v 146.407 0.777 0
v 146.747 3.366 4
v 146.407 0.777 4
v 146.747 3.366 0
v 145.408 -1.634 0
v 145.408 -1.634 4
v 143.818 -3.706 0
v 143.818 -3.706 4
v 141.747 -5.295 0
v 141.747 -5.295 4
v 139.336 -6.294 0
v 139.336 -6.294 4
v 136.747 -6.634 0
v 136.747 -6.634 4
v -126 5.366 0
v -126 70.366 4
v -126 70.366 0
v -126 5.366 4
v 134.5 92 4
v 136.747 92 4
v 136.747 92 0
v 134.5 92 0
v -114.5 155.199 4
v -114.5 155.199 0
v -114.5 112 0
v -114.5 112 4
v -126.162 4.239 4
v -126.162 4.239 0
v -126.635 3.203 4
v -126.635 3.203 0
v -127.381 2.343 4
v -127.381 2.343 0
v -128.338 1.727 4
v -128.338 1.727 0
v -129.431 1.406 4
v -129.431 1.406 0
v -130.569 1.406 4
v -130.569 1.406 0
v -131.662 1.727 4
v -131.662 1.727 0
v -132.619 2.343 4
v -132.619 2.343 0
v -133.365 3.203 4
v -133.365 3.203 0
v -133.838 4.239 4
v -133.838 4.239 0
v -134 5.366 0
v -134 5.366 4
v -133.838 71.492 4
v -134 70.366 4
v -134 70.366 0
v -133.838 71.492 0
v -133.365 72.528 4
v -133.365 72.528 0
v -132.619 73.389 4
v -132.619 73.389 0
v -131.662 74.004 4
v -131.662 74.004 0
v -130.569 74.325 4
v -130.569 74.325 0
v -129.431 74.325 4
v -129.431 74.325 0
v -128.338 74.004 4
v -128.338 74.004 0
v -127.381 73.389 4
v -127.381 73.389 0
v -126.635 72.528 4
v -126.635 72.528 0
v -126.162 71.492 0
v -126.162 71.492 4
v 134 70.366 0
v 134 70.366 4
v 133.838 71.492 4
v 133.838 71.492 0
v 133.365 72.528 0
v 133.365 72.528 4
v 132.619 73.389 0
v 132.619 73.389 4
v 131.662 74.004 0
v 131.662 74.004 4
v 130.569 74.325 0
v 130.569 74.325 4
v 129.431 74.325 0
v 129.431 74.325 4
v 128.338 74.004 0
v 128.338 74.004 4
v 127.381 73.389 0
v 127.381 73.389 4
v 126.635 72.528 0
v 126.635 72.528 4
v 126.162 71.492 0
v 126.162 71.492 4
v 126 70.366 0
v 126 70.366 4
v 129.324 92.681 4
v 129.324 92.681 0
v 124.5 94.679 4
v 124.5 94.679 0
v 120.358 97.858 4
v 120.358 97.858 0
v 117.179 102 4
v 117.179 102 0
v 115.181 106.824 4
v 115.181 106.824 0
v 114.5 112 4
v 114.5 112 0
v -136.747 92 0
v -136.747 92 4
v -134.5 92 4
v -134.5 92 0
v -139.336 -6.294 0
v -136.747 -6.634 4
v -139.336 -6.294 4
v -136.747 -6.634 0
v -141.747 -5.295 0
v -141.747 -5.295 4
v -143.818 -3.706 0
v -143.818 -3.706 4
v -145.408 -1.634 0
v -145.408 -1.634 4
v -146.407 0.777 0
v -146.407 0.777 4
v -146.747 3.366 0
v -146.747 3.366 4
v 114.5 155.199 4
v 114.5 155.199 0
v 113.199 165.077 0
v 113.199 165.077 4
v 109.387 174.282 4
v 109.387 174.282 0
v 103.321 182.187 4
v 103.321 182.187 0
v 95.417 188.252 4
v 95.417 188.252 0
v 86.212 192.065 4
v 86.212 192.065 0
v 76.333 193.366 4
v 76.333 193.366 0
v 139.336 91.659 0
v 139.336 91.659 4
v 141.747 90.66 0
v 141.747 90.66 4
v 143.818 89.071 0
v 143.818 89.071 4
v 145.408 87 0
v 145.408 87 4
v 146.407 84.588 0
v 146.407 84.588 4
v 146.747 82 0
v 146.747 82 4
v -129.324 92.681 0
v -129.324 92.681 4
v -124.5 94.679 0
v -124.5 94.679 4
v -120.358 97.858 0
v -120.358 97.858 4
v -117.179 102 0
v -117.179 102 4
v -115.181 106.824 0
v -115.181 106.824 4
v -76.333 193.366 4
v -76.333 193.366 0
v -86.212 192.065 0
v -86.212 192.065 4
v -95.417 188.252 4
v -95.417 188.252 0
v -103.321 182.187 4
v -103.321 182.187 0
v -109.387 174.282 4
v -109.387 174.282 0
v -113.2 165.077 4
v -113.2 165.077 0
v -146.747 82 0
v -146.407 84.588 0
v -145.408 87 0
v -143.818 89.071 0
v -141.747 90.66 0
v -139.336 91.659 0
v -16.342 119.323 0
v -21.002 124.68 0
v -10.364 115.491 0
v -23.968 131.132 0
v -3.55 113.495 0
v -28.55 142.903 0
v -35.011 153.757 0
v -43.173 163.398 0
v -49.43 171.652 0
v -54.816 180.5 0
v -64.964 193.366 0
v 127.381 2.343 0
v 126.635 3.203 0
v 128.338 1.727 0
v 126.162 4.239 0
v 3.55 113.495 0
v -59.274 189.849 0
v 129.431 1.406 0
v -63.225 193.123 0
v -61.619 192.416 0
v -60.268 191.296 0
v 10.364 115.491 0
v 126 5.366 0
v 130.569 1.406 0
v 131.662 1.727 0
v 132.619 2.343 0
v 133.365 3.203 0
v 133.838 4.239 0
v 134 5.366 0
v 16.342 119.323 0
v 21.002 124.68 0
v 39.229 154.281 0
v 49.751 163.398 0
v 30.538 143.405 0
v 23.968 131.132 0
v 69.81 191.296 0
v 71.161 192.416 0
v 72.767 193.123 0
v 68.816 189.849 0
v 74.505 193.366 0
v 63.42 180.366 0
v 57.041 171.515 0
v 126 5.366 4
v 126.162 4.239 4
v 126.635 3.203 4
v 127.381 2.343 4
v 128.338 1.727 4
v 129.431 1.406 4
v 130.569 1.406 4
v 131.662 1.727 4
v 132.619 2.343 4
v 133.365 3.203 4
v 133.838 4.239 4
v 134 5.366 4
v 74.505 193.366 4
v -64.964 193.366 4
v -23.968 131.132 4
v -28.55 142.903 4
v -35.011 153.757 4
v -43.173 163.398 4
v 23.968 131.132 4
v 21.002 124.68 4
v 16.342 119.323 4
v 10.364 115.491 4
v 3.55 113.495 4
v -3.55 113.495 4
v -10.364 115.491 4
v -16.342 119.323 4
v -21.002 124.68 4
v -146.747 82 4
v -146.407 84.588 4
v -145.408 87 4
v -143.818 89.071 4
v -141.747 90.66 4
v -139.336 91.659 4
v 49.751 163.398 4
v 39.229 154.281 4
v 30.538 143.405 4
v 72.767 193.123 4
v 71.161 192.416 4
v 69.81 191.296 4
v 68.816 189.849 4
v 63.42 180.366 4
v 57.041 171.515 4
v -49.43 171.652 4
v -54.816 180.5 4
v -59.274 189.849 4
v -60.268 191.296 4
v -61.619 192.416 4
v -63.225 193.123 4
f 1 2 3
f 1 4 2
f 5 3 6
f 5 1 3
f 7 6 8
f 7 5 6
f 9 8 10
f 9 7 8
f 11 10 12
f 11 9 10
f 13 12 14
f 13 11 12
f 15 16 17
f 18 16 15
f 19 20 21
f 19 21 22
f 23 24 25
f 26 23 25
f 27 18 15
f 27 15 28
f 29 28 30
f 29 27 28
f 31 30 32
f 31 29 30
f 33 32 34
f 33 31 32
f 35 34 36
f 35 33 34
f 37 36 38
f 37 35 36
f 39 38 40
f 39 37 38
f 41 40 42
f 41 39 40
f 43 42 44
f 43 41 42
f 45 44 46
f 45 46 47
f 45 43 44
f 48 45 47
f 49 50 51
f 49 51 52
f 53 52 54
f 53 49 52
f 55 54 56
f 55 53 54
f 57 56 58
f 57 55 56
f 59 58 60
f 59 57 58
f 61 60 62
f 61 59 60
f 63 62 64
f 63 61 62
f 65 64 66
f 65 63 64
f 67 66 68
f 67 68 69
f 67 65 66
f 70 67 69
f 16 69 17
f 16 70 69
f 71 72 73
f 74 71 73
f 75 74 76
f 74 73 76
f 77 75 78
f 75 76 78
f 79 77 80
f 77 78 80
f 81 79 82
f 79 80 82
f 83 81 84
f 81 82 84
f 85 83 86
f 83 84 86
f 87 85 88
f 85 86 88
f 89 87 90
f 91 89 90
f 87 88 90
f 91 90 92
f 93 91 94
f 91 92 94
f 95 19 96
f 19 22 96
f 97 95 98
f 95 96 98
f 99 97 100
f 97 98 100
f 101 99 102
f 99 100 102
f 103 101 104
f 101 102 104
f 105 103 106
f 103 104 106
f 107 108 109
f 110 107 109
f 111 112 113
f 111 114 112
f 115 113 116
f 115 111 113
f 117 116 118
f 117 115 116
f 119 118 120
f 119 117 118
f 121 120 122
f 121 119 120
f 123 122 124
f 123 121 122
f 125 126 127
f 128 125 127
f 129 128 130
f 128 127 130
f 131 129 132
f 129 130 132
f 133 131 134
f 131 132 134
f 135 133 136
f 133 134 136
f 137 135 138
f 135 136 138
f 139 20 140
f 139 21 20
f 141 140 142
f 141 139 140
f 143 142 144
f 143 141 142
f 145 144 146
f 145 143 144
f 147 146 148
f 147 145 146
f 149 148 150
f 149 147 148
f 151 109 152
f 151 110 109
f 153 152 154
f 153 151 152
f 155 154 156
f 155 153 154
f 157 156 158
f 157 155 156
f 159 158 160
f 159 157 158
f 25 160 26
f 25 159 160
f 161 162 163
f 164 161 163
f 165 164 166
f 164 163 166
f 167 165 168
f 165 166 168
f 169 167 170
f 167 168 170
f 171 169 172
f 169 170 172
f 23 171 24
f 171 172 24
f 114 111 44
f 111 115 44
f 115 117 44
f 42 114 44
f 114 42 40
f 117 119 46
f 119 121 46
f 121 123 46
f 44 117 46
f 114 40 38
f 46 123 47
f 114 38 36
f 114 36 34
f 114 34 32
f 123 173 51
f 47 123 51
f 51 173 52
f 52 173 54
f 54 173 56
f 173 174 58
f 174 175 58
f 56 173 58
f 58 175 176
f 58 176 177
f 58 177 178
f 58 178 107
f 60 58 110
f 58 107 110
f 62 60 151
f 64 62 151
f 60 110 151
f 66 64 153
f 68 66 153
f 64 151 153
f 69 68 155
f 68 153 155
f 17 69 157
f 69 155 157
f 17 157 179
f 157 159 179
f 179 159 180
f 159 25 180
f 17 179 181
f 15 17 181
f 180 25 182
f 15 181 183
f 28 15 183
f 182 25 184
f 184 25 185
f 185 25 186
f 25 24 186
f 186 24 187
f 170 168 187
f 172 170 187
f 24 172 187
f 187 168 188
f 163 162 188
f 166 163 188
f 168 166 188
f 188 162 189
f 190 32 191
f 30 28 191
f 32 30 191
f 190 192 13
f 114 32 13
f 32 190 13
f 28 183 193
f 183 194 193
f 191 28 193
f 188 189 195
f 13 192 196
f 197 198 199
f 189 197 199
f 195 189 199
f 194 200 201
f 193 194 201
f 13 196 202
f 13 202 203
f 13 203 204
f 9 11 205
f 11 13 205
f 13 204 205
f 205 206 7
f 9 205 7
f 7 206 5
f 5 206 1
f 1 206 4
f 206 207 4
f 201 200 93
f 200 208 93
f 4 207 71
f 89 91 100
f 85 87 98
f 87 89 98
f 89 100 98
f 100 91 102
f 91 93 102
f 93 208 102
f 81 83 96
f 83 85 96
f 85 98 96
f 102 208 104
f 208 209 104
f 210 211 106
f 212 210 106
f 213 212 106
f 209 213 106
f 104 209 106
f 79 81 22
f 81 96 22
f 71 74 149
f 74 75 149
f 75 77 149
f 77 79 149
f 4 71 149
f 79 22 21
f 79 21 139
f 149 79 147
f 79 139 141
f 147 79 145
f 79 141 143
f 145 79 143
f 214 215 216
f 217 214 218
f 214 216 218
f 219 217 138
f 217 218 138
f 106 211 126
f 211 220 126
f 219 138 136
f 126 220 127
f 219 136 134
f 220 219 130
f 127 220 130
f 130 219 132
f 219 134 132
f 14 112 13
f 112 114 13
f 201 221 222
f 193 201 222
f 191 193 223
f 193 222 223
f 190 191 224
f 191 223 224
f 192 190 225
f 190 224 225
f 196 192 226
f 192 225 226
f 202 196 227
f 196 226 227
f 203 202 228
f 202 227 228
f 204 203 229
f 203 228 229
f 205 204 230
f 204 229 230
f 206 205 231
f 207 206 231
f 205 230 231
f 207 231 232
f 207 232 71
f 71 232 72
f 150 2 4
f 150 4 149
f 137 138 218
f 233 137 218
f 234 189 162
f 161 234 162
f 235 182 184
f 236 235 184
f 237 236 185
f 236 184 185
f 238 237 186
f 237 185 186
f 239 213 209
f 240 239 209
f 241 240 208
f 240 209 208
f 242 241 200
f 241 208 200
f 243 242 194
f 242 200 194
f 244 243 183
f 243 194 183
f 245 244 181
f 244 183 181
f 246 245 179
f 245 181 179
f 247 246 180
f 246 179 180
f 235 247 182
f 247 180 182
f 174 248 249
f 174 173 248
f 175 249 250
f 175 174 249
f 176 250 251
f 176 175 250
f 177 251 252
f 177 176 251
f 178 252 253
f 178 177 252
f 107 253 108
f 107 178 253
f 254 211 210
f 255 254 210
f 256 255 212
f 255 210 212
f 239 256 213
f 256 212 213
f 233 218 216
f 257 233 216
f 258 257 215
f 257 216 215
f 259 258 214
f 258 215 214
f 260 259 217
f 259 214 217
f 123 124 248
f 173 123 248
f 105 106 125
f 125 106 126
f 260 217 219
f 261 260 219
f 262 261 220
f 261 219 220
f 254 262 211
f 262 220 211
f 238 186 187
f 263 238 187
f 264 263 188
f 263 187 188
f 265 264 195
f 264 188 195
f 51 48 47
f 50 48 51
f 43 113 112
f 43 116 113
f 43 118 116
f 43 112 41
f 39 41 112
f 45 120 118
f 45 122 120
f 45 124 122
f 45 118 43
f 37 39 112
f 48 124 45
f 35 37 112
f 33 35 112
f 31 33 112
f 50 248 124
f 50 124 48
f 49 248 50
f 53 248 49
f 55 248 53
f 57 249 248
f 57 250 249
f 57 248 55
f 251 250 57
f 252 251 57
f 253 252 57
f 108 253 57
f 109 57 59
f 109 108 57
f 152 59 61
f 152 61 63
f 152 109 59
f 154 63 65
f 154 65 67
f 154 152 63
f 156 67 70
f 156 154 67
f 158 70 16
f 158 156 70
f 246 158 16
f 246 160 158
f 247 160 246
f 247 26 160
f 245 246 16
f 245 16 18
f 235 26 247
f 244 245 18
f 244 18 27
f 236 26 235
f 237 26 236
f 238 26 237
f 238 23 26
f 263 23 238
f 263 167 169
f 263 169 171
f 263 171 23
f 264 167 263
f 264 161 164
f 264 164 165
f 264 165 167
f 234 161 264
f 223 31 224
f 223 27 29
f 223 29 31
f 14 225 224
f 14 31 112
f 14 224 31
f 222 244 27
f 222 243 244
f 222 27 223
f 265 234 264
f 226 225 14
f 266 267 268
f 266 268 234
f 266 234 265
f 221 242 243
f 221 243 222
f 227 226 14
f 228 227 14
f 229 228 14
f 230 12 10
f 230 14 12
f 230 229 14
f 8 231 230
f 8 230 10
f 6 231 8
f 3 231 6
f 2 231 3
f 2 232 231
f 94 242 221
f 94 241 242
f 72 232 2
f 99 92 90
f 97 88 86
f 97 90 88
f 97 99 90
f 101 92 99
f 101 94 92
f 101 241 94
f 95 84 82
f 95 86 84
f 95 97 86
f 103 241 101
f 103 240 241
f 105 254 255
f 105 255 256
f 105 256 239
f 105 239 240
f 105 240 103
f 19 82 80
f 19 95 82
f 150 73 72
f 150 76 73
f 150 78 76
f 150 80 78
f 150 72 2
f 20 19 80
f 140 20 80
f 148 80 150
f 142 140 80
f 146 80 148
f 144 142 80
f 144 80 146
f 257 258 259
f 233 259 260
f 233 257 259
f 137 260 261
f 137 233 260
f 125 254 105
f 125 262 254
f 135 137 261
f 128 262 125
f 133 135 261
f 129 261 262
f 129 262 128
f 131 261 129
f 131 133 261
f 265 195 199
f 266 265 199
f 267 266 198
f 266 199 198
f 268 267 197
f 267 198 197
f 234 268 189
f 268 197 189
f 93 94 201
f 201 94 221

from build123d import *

# Parameters (mm, degrees)
BOSS_EXTRUDE1_DEPTH = 4
SKETCH3_W           = 32.247348798
SKETCH3_H           = 98.634443856
BOSS_EXTRUDE2_DEPTH = 4
FILLET1_R           = 10
FILLET2_R           = 20


with BuildPart() as part:
    # Sketch2 → Boss-Extrude1 (new body)
    with BuildSketch(Plane.XY):
        with BuildLine():
            Line((76.333327253, 193.365556144), (74.505250646, 193.365556144))
            ThreePointArc((74.505250646, 193.365556144), (71.161018329, 192.415530393), (68.815701693, 189.849223982))
            ThreePointArc((68.815701693, 189.849223982), (60.349326569, 175.855147798), (49.750675278, 163.39793034))
            ThreePointArc((49.750675278, 163.39793034), (34.635352262, 149.04171936), (23.967616463, 131.131577079))
            ThreePointArc((23.967616463, 131.131577079), (-2.91e-07, 113.241661662), (-23.967618369, 131.131575305))
            ThreePointArc((-23.967618369, 131.131575305), (-31.555288195, 148.464095417), (-43.172927111, 163.397931257))
            ThreePointArc((-43.172927111, 163.397931257), (-52.235367622, 176.00763771), (-59.274047079, 189.849224193))
            ThreePointArc((-59.274047079, 189.849224193), (-61.61936371, 192.415530455), (-64.963595927, 193.365556144))
            Line((-64.963595927, 193.365556144), (-76.333338023, 193.365556144))
            ThreePointArc((-76.333338023, 193.365556144), (-103.321247, 182.186797795), (-114.500004355, 155.198888406))
            Line((-114.500004355, 155.198888406), (-114.500004355, -6.634443856))
            Line((-114.500004355, -6.634443856), (114.49999565, -6.634443856))
            Line((114.49999565, -6.634443856), (114.49999565, 155.198890546))
            ThreePointArc((114.49999565, 155.198890546), (103.321236808, 182.186799282), (76.333327253, 193.365556144))
        make_face()
    extrude(amount=BOSS_EXTRUDE1_DEPTH)


with BuildPart() as boss_extrude2_tool:
    # Sketch3 → Boss-Extrude2 (new body)
    # profile 1 of 2: a face of its own
    with BuildSketch(Plane.XY.offset(4)):
        with Locations((-130.623678754, 42.682778072)):
            Rectangle(SKETCH3_W, SKETCH3_H)
        with BuildLine():
            Line((-125.999999998, 70.365556144), (-125.999999998, 5.365556144))
            ThreePointArc((-125.999999998, 5.365556144), (-129.999999998, 1.365556144), (-133.999999998, 5.365556144))
            Line((-133.999999998, 5.365556144), (-133.999999998, 70.365556144))
            ThreePointArc((-133.999999998, 70.365556144), (-129.999999998, 74.365556144), (-125.999999998, 70.365556144))
        make_face(mode=Mode.SUBTRACT)
    # profile 2 of 2: a face of its own
    with BuildSketch(Plane.XY.offset(4)):
        Polygon((114.500004355, 92), (114.49999565, -6.634443856), (146.747353153, -6.634443856), (146.747353153, 92), align=None)
        with BuildLine():
            Line((125.999999998, 70.365556144), (125.999999998, 5.365556144))
            ThreePointArc((125.999999998, 5.365556144), (129.999999998, 1.365556144), (133.999999998, 5.365556144))
            Line((133.999999998, 5.365556144), (133.999999998, 70.365556144))
            ThreePointArc((133.999999998, 70.365556144), (129.999999998, 74.365556144), (125.999999998, 70.365556144))
        make_face(mode=Mode.SUBTRACT)
    extrude(amount=-BOSS_EXTRUDE2_DEPTH)


with BuildPart() as part_1:
    add(part.part)


with BuildPart() as part_2:
    # Boss-Extrude2: joined with boss_extrude2_tool
    add(part_1.part.fuse(boss_extrude2_tool.part, tol=0.00001))

    # Fillet1
    fillet1_edges = [part_2.edges().sort_by_distance(p)[0] for p in [
        (146.747353153, 92, 2),
        (146.747353153, -6.634443856, 2),
        (-146.747353153, -6.634443856, 2),
        (-146.747353153, 92, 2),
    ]]
    fillet(fillet1_edges, radius=FILLET1_R)

    # Fillet2
    fillet2_edges = [part_2.edges().sort_by_distance(p)[0] for p in [
        (-114.500004355, 92, 2),
        (114.500004355, 92, 2),
    ]]
    fillet(fillet2_edges, radius=FILLET2_R)


solid = part_2.part
